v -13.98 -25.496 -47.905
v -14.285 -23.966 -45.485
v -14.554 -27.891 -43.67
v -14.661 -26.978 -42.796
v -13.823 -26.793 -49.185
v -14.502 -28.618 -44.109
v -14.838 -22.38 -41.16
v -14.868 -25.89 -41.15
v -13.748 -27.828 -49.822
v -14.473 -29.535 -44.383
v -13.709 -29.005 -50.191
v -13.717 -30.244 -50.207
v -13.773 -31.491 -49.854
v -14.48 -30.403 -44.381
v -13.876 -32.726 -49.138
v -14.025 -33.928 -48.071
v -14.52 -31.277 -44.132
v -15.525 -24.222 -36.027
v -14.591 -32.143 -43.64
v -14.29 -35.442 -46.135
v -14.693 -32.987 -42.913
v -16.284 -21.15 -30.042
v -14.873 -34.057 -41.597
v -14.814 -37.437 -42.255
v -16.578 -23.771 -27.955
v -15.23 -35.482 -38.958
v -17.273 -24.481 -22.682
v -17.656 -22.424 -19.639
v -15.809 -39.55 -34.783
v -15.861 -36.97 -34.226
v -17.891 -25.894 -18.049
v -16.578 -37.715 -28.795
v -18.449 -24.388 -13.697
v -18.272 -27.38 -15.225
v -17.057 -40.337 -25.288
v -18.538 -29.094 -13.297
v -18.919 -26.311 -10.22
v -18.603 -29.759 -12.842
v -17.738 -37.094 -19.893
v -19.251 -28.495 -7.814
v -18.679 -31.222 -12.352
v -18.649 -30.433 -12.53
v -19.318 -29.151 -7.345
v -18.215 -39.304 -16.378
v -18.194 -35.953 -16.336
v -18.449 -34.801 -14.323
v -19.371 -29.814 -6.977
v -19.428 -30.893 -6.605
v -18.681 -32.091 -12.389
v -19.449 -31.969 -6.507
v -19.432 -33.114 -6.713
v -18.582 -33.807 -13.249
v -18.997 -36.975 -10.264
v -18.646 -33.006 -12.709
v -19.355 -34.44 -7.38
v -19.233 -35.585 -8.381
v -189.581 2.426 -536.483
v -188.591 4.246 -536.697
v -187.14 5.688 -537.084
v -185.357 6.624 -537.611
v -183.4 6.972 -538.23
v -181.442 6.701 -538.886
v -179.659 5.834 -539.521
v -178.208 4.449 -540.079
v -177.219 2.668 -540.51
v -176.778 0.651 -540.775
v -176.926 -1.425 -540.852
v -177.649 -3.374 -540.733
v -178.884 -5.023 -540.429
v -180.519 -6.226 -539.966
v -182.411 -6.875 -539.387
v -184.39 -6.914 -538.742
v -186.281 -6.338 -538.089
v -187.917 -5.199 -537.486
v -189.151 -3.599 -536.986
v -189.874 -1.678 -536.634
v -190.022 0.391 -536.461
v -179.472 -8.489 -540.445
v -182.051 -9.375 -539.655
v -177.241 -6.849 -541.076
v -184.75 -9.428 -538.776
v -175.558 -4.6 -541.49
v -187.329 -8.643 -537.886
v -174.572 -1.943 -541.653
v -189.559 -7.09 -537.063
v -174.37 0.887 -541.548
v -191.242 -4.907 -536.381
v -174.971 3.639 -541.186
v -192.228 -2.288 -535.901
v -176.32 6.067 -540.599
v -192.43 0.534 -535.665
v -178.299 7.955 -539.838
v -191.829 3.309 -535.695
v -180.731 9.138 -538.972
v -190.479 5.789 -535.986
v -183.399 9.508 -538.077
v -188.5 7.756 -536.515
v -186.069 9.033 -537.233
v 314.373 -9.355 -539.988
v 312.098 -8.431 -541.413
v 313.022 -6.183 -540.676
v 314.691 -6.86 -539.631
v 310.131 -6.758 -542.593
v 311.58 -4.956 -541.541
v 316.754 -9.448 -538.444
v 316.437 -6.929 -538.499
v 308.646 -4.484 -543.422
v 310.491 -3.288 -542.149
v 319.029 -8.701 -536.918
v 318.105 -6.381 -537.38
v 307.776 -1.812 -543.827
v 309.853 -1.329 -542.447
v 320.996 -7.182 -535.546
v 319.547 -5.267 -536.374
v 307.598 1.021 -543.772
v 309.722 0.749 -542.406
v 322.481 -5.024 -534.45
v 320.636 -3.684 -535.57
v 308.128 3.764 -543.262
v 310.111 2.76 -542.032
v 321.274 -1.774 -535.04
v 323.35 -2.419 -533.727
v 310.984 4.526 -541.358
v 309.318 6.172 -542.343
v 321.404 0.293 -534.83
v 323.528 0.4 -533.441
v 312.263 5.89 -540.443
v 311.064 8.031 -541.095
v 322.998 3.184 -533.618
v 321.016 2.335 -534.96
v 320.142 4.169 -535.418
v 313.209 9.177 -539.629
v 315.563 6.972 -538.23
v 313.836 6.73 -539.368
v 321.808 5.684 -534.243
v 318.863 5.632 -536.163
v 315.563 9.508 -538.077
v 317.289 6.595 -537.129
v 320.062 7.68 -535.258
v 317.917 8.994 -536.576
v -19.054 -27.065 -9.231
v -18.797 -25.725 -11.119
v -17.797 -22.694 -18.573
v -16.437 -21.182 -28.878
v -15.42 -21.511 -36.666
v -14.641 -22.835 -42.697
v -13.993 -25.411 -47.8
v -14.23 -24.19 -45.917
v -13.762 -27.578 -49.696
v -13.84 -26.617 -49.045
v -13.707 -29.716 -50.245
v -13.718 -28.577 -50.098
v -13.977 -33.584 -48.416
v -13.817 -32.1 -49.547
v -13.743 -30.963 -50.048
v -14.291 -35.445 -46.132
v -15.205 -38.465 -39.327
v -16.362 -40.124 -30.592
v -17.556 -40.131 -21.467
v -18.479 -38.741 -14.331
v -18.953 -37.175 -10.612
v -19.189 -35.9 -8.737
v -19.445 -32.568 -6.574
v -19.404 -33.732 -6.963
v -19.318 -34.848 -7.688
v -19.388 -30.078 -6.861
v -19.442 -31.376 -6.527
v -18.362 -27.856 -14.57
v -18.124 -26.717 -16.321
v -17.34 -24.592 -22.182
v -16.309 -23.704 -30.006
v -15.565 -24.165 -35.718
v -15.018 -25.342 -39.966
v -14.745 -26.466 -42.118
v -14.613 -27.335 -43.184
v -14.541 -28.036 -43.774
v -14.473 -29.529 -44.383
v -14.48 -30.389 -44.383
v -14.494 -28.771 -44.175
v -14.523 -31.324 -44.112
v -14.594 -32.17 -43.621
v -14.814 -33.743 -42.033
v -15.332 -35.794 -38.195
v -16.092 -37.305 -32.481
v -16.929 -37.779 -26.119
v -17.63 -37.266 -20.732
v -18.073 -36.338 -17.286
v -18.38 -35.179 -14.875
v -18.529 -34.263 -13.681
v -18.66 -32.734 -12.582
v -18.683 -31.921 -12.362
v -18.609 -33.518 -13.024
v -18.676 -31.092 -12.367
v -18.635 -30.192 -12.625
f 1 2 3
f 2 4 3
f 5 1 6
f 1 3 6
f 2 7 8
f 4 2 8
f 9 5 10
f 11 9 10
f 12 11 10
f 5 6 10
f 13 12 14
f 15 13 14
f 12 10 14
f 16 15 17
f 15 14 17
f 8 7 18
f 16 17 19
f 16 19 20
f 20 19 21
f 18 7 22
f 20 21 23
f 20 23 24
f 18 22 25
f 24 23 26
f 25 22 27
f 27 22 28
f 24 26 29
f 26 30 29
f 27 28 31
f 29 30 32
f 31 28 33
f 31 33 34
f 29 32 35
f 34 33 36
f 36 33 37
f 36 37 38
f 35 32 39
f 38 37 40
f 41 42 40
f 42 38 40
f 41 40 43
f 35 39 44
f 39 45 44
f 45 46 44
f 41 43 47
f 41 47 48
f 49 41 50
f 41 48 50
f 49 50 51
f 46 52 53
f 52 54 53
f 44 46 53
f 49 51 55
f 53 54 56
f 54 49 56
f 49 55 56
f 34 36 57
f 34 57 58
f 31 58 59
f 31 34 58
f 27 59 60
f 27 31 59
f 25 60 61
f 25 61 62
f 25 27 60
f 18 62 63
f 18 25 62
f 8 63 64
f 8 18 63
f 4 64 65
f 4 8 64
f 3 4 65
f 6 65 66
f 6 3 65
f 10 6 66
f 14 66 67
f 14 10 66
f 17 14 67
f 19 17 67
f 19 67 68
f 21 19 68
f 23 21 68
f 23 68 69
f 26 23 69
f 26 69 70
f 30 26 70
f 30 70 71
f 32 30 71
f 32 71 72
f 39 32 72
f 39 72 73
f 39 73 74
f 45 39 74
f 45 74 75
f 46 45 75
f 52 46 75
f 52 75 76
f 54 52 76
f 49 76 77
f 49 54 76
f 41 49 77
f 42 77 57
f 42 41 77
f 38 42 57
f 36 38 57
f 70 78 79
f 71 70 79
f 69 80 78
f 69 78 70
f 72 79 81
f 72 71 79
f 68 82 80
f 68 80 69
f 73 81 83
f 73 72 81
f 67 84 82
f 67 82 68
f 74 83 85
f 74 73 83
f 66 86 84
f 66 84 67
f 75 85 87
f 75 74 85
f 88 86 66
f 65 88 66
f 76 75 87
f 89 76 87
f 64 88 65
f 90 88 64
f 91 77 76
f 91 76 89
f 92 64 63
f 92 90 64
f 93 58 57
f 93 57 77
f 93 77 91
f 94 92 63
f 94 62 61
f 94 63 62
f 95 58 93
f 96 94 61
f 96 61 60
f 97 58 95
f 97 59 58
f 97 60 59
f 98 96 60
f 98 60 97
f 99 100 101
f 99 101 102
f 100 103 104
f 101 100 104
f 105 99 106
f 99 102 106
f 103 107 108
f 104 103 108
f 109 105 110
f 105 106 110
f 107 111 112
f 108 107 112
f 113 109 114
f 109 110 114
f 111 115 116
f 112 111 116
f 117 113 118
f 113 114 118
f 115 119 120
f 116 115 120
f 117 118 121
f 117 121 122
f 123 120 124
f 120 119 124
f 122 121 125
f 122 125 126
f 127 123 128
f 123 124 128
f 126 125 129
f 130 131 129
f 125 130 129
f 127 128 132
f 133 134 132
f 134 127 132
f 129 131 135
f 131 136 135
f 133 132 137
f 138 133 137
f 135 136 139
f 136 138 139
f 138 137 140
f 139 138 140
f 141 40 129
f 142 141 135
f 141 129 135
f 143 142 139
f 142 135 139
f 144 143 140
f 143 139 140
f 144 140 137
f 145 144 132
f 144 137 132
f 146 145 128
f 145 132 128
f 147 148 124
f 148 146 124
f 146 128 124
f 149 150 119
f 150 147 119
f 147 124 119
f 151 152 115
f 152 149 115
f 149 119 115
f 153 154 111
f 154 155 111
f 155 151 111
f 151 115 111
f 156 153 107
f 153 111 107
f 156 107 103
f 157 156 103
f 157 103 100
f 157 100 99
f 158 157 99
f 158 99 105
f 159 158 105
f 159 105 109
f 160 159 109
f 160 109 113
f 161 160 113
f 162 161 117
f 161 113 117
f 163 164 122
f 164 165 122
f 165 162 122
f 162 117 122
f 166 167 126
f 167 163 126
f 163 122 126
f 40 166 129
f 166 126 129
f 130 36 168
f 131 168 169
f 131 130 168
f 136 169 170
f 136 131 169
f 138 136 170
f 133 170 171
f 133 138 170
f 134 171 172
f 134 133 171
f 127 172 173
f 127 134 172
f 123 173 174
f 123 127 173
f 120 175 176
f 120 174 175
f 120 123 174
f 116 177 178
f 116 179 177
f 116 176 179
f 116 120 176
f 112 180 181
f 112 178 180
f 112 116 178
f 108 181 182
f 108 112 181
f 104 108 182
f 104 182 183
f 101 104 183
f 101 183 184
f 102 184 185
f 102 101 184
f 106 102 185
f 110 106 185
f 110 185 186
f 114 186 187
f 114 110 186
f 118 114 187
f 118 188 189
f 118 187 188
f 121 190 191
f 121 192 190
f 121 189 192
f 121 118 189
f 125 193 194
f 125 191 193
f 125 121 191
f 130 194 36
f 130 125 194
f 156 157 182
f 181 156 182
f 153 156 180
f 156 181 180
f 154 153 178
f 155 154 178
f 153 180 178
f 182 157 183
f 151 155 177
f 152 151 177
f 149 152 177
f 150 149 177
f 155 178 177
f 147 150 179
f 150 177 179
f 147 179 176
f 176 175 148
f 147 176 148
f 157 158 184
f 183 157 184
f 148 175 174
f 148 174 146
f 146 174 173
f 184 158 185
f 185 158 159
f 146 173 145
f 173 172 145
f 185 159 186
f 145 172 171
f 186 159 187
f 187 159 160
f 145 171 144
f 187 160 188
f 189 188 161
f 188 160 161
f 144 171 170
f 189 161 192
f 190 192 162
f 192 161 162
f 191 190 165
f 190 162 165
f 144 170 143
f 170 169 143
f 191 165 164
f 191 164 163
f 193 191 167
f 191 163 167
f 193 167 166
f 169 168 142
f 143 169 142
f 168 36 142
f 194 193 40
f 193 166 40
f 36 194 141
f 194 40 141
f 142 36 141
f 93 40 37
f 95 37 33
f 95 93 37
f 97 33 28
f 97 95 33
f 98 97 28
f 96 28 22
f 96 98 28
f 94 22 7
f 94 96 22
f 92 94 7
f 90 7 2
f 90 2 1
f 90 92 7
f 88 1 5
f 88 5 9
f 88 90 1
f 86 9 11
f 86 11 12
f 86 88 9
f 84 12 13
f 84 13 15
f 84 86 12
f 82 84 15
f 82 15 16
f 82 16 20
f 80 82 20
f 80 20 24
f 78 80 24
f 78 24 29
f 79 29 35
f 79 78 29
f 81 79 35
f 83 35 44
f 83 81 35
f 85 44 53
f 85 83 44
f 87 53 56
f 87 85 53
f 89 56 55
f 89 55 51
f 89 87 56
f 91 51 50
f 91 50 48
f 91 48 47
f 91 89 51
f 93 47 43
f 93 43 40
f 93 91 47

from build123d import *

# Parameters (mm, degrees)
SKETCH1_ON_SEGMENT_1_R                         = 9.525
SKETCH1_ON_SEGMENT_1_R_2                       = 6.985
PIPE_STANDARD_S40_PIPE_1_SCH_40_5_DEPTH        = 638.812049493
SKETCH1_R                                      = 9.525
SKETCH1_R_2                                    = 6.985
PIPE_STANDARD_S40_PIPE_1_SCH_40_5_2_DEPTH      = 537.731427899
PIPE_STANDARD_S40_PIPE_1_SCH_40_5_2_DEPTH_BACK = 29.186654936


with BuildPart() as part:
    # Sketch1 on segment 1 (carried to segment 1) → Pipe standard s40 PIPE 1 SCH 40(5) (new body)
    with BuildSketch(Plane(origin=(315.563263322, 0, -538.649609422), x_dir=(0.780565152, 0.334231479, 0.528211474), z_dir=(-0.544828119, -0.050429144, 0.837030001))):
        Circle(SKETCH1_ON_SEGMENT_1_R)
        Circle(SKETCH1_ON_SEGMENT_1_R_2, mode=Mode.SUBTRACT)
    extrude(amount=PIPE_STANDARD_S40_PIPE_1_SCH_40_5_DEPTH)

    # Pipe standard s40 PIPE 1 SCH 40(5) mitre
    split(bisect_by=Plane(origin=(-16.577793594, -30.742886911, -28.374864893), x_dir=(0.007884929, 0.999968913, 0), z_dir=(0.991513492, -0.007818257, 0.129768522)), keep=Keep.TOP)


with BuildPart() as body_2:
    # Sketch1 → Pipe standard s40 PIPE 1 SCH 40_5 2 (new, two sides)
    with BuildSketch(Plane(origin=(-16.577793594, -30.742886911, -28.374864893), x_dir=(-0.8849256600733008, 0.3473641648259723, 0.31023332048409596), z_dir=(-0.3102333204840959, 0.057171452728250034, -0.9489397830496694))) as pipe_standard_s40_pipe_1_sch_40_5_2_sk:
        Circle(SKETCH1_R)
        Circle(SKETCH1_R_2, mode=Mode.SUBTRACT)
    extrude(amount=PIPE_STANDARD_S40_PIPE_1_SCH_40_5_2_DEPTH)
    extrude(pipe_standard_s40_pipe_1_sch_40_5_2_sk.sketch, amount=-PIPE_STANDARD_S40_PIPE_1_SCH_40_5_2_DEPTH_BACK)

    # Pipe standard s40 PIPE 1 SCH 40_5 2 mitr
    split(bisect_by=Plane(origin=(-16.577793594, -30.742886911, -28.374864893), x_dir=(-0.007884929, -0.999968913, 0), z_dir=(-0.991513492, 0.007818257, -0.129768522)), keep=Keep.TOP)


solid = Compound([part.part, body_2.part])
